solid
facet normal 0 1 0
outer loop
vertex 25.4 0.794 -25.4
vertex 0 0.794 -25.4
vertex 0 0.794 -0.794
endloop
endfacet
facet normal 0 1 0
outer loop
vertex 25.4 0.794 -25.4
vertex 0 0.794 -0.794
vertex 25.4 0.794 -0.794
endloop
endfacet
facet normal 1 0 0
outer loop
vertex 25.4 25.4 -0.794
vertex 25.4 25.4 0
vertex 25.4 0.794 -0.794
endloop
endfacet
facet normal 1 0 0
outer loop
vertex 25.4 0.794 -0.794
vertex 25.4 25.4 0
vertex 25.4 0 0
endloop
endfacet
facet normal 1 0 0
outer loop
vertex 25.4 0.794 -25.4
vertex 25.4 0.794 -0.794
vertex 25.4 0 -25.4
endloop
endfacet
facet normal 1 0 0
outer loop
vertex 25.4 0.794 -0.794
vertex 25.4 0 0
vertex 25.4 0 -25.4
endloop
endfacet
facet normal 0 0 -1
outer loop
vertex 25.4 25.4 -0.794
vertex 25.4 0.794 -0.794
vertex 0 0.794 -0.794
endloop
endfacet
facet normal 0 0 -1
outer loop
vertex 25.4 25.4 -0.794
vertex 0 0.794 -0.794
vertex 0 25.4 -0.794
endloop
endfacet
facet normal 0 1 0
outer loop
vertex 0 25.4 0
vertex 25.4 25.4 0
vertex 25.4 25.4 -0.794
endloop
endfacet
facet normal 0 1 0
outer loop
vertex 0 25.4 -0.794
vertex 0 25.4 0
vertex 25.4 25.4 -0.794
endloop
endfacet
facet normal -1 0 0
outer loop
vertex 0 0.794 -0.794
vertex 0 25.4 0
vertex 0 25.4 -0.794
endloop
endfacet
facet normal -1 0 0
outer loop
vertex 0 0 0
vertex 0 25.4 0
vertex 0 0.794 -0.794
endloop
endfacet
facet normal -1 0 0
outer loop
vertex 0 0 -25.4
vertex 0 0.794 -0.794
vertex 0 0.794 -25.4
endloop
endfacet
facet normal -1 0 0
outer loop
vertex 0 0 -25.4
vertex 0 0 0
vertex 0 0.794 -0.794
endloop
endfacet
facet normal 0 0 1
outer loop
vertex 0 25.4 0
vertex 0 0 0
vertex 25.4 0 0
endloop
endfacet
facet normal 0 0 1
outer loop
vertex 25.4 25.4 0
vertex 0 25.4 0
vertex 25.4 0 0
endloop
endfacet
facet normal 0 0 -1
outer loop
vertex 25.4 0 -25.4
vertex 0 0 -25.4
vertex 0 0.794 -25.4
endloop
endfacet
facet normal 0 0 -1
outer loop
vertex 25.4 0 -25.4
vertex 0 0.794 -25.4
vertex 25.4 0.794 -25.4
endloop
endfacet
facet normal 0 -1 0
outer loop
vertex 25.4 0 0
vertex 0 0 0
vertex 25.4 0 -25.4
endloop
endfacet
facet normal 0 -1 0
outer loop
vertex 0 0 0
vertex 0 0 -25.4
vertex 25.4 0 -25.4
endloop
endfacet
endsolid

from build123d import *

# Parameters (mm, degrees)
SKETCH1_W           = 25.4
SKETCH1_H           = 25.4
BOSS_EXTRUDE1_DEPTH = 0.79375
SKETCH2_W           = 0.79375
SKETCH2_H           = 25.4
BOSS_EXTRUDE2_DEPTH = 25.4


with BuildPart() as part:
    # Sketch1 → Boss-Extrude1 (new body)
    with BuildSketch(Plane(origin=(0, 0, 0), x_dir=(1, 0, 0), z_dir=(0, 1, 0))):
        with Locations((12.7, 12.7)):
            Rectangle(SKETCH1_W, SKETCH1_H)
    extrude(amount=BOSS_EXTRUDE1_DEPTH)

    # Sketch2 → Boss-Extrude2 (add)
    with BuildSketch(Plane(origin=(25.4, 0, 0), x_dir=(0, 0, -1), z_dir=(1, 0, 0))):
        with Locations((0.396875, 12.7)):
            Rectangle(SKETCH2_W, SKETCH2_H)
    extrude(amount=-BOSS_EXTRUDE2_DEPTH)


solid = part.part
